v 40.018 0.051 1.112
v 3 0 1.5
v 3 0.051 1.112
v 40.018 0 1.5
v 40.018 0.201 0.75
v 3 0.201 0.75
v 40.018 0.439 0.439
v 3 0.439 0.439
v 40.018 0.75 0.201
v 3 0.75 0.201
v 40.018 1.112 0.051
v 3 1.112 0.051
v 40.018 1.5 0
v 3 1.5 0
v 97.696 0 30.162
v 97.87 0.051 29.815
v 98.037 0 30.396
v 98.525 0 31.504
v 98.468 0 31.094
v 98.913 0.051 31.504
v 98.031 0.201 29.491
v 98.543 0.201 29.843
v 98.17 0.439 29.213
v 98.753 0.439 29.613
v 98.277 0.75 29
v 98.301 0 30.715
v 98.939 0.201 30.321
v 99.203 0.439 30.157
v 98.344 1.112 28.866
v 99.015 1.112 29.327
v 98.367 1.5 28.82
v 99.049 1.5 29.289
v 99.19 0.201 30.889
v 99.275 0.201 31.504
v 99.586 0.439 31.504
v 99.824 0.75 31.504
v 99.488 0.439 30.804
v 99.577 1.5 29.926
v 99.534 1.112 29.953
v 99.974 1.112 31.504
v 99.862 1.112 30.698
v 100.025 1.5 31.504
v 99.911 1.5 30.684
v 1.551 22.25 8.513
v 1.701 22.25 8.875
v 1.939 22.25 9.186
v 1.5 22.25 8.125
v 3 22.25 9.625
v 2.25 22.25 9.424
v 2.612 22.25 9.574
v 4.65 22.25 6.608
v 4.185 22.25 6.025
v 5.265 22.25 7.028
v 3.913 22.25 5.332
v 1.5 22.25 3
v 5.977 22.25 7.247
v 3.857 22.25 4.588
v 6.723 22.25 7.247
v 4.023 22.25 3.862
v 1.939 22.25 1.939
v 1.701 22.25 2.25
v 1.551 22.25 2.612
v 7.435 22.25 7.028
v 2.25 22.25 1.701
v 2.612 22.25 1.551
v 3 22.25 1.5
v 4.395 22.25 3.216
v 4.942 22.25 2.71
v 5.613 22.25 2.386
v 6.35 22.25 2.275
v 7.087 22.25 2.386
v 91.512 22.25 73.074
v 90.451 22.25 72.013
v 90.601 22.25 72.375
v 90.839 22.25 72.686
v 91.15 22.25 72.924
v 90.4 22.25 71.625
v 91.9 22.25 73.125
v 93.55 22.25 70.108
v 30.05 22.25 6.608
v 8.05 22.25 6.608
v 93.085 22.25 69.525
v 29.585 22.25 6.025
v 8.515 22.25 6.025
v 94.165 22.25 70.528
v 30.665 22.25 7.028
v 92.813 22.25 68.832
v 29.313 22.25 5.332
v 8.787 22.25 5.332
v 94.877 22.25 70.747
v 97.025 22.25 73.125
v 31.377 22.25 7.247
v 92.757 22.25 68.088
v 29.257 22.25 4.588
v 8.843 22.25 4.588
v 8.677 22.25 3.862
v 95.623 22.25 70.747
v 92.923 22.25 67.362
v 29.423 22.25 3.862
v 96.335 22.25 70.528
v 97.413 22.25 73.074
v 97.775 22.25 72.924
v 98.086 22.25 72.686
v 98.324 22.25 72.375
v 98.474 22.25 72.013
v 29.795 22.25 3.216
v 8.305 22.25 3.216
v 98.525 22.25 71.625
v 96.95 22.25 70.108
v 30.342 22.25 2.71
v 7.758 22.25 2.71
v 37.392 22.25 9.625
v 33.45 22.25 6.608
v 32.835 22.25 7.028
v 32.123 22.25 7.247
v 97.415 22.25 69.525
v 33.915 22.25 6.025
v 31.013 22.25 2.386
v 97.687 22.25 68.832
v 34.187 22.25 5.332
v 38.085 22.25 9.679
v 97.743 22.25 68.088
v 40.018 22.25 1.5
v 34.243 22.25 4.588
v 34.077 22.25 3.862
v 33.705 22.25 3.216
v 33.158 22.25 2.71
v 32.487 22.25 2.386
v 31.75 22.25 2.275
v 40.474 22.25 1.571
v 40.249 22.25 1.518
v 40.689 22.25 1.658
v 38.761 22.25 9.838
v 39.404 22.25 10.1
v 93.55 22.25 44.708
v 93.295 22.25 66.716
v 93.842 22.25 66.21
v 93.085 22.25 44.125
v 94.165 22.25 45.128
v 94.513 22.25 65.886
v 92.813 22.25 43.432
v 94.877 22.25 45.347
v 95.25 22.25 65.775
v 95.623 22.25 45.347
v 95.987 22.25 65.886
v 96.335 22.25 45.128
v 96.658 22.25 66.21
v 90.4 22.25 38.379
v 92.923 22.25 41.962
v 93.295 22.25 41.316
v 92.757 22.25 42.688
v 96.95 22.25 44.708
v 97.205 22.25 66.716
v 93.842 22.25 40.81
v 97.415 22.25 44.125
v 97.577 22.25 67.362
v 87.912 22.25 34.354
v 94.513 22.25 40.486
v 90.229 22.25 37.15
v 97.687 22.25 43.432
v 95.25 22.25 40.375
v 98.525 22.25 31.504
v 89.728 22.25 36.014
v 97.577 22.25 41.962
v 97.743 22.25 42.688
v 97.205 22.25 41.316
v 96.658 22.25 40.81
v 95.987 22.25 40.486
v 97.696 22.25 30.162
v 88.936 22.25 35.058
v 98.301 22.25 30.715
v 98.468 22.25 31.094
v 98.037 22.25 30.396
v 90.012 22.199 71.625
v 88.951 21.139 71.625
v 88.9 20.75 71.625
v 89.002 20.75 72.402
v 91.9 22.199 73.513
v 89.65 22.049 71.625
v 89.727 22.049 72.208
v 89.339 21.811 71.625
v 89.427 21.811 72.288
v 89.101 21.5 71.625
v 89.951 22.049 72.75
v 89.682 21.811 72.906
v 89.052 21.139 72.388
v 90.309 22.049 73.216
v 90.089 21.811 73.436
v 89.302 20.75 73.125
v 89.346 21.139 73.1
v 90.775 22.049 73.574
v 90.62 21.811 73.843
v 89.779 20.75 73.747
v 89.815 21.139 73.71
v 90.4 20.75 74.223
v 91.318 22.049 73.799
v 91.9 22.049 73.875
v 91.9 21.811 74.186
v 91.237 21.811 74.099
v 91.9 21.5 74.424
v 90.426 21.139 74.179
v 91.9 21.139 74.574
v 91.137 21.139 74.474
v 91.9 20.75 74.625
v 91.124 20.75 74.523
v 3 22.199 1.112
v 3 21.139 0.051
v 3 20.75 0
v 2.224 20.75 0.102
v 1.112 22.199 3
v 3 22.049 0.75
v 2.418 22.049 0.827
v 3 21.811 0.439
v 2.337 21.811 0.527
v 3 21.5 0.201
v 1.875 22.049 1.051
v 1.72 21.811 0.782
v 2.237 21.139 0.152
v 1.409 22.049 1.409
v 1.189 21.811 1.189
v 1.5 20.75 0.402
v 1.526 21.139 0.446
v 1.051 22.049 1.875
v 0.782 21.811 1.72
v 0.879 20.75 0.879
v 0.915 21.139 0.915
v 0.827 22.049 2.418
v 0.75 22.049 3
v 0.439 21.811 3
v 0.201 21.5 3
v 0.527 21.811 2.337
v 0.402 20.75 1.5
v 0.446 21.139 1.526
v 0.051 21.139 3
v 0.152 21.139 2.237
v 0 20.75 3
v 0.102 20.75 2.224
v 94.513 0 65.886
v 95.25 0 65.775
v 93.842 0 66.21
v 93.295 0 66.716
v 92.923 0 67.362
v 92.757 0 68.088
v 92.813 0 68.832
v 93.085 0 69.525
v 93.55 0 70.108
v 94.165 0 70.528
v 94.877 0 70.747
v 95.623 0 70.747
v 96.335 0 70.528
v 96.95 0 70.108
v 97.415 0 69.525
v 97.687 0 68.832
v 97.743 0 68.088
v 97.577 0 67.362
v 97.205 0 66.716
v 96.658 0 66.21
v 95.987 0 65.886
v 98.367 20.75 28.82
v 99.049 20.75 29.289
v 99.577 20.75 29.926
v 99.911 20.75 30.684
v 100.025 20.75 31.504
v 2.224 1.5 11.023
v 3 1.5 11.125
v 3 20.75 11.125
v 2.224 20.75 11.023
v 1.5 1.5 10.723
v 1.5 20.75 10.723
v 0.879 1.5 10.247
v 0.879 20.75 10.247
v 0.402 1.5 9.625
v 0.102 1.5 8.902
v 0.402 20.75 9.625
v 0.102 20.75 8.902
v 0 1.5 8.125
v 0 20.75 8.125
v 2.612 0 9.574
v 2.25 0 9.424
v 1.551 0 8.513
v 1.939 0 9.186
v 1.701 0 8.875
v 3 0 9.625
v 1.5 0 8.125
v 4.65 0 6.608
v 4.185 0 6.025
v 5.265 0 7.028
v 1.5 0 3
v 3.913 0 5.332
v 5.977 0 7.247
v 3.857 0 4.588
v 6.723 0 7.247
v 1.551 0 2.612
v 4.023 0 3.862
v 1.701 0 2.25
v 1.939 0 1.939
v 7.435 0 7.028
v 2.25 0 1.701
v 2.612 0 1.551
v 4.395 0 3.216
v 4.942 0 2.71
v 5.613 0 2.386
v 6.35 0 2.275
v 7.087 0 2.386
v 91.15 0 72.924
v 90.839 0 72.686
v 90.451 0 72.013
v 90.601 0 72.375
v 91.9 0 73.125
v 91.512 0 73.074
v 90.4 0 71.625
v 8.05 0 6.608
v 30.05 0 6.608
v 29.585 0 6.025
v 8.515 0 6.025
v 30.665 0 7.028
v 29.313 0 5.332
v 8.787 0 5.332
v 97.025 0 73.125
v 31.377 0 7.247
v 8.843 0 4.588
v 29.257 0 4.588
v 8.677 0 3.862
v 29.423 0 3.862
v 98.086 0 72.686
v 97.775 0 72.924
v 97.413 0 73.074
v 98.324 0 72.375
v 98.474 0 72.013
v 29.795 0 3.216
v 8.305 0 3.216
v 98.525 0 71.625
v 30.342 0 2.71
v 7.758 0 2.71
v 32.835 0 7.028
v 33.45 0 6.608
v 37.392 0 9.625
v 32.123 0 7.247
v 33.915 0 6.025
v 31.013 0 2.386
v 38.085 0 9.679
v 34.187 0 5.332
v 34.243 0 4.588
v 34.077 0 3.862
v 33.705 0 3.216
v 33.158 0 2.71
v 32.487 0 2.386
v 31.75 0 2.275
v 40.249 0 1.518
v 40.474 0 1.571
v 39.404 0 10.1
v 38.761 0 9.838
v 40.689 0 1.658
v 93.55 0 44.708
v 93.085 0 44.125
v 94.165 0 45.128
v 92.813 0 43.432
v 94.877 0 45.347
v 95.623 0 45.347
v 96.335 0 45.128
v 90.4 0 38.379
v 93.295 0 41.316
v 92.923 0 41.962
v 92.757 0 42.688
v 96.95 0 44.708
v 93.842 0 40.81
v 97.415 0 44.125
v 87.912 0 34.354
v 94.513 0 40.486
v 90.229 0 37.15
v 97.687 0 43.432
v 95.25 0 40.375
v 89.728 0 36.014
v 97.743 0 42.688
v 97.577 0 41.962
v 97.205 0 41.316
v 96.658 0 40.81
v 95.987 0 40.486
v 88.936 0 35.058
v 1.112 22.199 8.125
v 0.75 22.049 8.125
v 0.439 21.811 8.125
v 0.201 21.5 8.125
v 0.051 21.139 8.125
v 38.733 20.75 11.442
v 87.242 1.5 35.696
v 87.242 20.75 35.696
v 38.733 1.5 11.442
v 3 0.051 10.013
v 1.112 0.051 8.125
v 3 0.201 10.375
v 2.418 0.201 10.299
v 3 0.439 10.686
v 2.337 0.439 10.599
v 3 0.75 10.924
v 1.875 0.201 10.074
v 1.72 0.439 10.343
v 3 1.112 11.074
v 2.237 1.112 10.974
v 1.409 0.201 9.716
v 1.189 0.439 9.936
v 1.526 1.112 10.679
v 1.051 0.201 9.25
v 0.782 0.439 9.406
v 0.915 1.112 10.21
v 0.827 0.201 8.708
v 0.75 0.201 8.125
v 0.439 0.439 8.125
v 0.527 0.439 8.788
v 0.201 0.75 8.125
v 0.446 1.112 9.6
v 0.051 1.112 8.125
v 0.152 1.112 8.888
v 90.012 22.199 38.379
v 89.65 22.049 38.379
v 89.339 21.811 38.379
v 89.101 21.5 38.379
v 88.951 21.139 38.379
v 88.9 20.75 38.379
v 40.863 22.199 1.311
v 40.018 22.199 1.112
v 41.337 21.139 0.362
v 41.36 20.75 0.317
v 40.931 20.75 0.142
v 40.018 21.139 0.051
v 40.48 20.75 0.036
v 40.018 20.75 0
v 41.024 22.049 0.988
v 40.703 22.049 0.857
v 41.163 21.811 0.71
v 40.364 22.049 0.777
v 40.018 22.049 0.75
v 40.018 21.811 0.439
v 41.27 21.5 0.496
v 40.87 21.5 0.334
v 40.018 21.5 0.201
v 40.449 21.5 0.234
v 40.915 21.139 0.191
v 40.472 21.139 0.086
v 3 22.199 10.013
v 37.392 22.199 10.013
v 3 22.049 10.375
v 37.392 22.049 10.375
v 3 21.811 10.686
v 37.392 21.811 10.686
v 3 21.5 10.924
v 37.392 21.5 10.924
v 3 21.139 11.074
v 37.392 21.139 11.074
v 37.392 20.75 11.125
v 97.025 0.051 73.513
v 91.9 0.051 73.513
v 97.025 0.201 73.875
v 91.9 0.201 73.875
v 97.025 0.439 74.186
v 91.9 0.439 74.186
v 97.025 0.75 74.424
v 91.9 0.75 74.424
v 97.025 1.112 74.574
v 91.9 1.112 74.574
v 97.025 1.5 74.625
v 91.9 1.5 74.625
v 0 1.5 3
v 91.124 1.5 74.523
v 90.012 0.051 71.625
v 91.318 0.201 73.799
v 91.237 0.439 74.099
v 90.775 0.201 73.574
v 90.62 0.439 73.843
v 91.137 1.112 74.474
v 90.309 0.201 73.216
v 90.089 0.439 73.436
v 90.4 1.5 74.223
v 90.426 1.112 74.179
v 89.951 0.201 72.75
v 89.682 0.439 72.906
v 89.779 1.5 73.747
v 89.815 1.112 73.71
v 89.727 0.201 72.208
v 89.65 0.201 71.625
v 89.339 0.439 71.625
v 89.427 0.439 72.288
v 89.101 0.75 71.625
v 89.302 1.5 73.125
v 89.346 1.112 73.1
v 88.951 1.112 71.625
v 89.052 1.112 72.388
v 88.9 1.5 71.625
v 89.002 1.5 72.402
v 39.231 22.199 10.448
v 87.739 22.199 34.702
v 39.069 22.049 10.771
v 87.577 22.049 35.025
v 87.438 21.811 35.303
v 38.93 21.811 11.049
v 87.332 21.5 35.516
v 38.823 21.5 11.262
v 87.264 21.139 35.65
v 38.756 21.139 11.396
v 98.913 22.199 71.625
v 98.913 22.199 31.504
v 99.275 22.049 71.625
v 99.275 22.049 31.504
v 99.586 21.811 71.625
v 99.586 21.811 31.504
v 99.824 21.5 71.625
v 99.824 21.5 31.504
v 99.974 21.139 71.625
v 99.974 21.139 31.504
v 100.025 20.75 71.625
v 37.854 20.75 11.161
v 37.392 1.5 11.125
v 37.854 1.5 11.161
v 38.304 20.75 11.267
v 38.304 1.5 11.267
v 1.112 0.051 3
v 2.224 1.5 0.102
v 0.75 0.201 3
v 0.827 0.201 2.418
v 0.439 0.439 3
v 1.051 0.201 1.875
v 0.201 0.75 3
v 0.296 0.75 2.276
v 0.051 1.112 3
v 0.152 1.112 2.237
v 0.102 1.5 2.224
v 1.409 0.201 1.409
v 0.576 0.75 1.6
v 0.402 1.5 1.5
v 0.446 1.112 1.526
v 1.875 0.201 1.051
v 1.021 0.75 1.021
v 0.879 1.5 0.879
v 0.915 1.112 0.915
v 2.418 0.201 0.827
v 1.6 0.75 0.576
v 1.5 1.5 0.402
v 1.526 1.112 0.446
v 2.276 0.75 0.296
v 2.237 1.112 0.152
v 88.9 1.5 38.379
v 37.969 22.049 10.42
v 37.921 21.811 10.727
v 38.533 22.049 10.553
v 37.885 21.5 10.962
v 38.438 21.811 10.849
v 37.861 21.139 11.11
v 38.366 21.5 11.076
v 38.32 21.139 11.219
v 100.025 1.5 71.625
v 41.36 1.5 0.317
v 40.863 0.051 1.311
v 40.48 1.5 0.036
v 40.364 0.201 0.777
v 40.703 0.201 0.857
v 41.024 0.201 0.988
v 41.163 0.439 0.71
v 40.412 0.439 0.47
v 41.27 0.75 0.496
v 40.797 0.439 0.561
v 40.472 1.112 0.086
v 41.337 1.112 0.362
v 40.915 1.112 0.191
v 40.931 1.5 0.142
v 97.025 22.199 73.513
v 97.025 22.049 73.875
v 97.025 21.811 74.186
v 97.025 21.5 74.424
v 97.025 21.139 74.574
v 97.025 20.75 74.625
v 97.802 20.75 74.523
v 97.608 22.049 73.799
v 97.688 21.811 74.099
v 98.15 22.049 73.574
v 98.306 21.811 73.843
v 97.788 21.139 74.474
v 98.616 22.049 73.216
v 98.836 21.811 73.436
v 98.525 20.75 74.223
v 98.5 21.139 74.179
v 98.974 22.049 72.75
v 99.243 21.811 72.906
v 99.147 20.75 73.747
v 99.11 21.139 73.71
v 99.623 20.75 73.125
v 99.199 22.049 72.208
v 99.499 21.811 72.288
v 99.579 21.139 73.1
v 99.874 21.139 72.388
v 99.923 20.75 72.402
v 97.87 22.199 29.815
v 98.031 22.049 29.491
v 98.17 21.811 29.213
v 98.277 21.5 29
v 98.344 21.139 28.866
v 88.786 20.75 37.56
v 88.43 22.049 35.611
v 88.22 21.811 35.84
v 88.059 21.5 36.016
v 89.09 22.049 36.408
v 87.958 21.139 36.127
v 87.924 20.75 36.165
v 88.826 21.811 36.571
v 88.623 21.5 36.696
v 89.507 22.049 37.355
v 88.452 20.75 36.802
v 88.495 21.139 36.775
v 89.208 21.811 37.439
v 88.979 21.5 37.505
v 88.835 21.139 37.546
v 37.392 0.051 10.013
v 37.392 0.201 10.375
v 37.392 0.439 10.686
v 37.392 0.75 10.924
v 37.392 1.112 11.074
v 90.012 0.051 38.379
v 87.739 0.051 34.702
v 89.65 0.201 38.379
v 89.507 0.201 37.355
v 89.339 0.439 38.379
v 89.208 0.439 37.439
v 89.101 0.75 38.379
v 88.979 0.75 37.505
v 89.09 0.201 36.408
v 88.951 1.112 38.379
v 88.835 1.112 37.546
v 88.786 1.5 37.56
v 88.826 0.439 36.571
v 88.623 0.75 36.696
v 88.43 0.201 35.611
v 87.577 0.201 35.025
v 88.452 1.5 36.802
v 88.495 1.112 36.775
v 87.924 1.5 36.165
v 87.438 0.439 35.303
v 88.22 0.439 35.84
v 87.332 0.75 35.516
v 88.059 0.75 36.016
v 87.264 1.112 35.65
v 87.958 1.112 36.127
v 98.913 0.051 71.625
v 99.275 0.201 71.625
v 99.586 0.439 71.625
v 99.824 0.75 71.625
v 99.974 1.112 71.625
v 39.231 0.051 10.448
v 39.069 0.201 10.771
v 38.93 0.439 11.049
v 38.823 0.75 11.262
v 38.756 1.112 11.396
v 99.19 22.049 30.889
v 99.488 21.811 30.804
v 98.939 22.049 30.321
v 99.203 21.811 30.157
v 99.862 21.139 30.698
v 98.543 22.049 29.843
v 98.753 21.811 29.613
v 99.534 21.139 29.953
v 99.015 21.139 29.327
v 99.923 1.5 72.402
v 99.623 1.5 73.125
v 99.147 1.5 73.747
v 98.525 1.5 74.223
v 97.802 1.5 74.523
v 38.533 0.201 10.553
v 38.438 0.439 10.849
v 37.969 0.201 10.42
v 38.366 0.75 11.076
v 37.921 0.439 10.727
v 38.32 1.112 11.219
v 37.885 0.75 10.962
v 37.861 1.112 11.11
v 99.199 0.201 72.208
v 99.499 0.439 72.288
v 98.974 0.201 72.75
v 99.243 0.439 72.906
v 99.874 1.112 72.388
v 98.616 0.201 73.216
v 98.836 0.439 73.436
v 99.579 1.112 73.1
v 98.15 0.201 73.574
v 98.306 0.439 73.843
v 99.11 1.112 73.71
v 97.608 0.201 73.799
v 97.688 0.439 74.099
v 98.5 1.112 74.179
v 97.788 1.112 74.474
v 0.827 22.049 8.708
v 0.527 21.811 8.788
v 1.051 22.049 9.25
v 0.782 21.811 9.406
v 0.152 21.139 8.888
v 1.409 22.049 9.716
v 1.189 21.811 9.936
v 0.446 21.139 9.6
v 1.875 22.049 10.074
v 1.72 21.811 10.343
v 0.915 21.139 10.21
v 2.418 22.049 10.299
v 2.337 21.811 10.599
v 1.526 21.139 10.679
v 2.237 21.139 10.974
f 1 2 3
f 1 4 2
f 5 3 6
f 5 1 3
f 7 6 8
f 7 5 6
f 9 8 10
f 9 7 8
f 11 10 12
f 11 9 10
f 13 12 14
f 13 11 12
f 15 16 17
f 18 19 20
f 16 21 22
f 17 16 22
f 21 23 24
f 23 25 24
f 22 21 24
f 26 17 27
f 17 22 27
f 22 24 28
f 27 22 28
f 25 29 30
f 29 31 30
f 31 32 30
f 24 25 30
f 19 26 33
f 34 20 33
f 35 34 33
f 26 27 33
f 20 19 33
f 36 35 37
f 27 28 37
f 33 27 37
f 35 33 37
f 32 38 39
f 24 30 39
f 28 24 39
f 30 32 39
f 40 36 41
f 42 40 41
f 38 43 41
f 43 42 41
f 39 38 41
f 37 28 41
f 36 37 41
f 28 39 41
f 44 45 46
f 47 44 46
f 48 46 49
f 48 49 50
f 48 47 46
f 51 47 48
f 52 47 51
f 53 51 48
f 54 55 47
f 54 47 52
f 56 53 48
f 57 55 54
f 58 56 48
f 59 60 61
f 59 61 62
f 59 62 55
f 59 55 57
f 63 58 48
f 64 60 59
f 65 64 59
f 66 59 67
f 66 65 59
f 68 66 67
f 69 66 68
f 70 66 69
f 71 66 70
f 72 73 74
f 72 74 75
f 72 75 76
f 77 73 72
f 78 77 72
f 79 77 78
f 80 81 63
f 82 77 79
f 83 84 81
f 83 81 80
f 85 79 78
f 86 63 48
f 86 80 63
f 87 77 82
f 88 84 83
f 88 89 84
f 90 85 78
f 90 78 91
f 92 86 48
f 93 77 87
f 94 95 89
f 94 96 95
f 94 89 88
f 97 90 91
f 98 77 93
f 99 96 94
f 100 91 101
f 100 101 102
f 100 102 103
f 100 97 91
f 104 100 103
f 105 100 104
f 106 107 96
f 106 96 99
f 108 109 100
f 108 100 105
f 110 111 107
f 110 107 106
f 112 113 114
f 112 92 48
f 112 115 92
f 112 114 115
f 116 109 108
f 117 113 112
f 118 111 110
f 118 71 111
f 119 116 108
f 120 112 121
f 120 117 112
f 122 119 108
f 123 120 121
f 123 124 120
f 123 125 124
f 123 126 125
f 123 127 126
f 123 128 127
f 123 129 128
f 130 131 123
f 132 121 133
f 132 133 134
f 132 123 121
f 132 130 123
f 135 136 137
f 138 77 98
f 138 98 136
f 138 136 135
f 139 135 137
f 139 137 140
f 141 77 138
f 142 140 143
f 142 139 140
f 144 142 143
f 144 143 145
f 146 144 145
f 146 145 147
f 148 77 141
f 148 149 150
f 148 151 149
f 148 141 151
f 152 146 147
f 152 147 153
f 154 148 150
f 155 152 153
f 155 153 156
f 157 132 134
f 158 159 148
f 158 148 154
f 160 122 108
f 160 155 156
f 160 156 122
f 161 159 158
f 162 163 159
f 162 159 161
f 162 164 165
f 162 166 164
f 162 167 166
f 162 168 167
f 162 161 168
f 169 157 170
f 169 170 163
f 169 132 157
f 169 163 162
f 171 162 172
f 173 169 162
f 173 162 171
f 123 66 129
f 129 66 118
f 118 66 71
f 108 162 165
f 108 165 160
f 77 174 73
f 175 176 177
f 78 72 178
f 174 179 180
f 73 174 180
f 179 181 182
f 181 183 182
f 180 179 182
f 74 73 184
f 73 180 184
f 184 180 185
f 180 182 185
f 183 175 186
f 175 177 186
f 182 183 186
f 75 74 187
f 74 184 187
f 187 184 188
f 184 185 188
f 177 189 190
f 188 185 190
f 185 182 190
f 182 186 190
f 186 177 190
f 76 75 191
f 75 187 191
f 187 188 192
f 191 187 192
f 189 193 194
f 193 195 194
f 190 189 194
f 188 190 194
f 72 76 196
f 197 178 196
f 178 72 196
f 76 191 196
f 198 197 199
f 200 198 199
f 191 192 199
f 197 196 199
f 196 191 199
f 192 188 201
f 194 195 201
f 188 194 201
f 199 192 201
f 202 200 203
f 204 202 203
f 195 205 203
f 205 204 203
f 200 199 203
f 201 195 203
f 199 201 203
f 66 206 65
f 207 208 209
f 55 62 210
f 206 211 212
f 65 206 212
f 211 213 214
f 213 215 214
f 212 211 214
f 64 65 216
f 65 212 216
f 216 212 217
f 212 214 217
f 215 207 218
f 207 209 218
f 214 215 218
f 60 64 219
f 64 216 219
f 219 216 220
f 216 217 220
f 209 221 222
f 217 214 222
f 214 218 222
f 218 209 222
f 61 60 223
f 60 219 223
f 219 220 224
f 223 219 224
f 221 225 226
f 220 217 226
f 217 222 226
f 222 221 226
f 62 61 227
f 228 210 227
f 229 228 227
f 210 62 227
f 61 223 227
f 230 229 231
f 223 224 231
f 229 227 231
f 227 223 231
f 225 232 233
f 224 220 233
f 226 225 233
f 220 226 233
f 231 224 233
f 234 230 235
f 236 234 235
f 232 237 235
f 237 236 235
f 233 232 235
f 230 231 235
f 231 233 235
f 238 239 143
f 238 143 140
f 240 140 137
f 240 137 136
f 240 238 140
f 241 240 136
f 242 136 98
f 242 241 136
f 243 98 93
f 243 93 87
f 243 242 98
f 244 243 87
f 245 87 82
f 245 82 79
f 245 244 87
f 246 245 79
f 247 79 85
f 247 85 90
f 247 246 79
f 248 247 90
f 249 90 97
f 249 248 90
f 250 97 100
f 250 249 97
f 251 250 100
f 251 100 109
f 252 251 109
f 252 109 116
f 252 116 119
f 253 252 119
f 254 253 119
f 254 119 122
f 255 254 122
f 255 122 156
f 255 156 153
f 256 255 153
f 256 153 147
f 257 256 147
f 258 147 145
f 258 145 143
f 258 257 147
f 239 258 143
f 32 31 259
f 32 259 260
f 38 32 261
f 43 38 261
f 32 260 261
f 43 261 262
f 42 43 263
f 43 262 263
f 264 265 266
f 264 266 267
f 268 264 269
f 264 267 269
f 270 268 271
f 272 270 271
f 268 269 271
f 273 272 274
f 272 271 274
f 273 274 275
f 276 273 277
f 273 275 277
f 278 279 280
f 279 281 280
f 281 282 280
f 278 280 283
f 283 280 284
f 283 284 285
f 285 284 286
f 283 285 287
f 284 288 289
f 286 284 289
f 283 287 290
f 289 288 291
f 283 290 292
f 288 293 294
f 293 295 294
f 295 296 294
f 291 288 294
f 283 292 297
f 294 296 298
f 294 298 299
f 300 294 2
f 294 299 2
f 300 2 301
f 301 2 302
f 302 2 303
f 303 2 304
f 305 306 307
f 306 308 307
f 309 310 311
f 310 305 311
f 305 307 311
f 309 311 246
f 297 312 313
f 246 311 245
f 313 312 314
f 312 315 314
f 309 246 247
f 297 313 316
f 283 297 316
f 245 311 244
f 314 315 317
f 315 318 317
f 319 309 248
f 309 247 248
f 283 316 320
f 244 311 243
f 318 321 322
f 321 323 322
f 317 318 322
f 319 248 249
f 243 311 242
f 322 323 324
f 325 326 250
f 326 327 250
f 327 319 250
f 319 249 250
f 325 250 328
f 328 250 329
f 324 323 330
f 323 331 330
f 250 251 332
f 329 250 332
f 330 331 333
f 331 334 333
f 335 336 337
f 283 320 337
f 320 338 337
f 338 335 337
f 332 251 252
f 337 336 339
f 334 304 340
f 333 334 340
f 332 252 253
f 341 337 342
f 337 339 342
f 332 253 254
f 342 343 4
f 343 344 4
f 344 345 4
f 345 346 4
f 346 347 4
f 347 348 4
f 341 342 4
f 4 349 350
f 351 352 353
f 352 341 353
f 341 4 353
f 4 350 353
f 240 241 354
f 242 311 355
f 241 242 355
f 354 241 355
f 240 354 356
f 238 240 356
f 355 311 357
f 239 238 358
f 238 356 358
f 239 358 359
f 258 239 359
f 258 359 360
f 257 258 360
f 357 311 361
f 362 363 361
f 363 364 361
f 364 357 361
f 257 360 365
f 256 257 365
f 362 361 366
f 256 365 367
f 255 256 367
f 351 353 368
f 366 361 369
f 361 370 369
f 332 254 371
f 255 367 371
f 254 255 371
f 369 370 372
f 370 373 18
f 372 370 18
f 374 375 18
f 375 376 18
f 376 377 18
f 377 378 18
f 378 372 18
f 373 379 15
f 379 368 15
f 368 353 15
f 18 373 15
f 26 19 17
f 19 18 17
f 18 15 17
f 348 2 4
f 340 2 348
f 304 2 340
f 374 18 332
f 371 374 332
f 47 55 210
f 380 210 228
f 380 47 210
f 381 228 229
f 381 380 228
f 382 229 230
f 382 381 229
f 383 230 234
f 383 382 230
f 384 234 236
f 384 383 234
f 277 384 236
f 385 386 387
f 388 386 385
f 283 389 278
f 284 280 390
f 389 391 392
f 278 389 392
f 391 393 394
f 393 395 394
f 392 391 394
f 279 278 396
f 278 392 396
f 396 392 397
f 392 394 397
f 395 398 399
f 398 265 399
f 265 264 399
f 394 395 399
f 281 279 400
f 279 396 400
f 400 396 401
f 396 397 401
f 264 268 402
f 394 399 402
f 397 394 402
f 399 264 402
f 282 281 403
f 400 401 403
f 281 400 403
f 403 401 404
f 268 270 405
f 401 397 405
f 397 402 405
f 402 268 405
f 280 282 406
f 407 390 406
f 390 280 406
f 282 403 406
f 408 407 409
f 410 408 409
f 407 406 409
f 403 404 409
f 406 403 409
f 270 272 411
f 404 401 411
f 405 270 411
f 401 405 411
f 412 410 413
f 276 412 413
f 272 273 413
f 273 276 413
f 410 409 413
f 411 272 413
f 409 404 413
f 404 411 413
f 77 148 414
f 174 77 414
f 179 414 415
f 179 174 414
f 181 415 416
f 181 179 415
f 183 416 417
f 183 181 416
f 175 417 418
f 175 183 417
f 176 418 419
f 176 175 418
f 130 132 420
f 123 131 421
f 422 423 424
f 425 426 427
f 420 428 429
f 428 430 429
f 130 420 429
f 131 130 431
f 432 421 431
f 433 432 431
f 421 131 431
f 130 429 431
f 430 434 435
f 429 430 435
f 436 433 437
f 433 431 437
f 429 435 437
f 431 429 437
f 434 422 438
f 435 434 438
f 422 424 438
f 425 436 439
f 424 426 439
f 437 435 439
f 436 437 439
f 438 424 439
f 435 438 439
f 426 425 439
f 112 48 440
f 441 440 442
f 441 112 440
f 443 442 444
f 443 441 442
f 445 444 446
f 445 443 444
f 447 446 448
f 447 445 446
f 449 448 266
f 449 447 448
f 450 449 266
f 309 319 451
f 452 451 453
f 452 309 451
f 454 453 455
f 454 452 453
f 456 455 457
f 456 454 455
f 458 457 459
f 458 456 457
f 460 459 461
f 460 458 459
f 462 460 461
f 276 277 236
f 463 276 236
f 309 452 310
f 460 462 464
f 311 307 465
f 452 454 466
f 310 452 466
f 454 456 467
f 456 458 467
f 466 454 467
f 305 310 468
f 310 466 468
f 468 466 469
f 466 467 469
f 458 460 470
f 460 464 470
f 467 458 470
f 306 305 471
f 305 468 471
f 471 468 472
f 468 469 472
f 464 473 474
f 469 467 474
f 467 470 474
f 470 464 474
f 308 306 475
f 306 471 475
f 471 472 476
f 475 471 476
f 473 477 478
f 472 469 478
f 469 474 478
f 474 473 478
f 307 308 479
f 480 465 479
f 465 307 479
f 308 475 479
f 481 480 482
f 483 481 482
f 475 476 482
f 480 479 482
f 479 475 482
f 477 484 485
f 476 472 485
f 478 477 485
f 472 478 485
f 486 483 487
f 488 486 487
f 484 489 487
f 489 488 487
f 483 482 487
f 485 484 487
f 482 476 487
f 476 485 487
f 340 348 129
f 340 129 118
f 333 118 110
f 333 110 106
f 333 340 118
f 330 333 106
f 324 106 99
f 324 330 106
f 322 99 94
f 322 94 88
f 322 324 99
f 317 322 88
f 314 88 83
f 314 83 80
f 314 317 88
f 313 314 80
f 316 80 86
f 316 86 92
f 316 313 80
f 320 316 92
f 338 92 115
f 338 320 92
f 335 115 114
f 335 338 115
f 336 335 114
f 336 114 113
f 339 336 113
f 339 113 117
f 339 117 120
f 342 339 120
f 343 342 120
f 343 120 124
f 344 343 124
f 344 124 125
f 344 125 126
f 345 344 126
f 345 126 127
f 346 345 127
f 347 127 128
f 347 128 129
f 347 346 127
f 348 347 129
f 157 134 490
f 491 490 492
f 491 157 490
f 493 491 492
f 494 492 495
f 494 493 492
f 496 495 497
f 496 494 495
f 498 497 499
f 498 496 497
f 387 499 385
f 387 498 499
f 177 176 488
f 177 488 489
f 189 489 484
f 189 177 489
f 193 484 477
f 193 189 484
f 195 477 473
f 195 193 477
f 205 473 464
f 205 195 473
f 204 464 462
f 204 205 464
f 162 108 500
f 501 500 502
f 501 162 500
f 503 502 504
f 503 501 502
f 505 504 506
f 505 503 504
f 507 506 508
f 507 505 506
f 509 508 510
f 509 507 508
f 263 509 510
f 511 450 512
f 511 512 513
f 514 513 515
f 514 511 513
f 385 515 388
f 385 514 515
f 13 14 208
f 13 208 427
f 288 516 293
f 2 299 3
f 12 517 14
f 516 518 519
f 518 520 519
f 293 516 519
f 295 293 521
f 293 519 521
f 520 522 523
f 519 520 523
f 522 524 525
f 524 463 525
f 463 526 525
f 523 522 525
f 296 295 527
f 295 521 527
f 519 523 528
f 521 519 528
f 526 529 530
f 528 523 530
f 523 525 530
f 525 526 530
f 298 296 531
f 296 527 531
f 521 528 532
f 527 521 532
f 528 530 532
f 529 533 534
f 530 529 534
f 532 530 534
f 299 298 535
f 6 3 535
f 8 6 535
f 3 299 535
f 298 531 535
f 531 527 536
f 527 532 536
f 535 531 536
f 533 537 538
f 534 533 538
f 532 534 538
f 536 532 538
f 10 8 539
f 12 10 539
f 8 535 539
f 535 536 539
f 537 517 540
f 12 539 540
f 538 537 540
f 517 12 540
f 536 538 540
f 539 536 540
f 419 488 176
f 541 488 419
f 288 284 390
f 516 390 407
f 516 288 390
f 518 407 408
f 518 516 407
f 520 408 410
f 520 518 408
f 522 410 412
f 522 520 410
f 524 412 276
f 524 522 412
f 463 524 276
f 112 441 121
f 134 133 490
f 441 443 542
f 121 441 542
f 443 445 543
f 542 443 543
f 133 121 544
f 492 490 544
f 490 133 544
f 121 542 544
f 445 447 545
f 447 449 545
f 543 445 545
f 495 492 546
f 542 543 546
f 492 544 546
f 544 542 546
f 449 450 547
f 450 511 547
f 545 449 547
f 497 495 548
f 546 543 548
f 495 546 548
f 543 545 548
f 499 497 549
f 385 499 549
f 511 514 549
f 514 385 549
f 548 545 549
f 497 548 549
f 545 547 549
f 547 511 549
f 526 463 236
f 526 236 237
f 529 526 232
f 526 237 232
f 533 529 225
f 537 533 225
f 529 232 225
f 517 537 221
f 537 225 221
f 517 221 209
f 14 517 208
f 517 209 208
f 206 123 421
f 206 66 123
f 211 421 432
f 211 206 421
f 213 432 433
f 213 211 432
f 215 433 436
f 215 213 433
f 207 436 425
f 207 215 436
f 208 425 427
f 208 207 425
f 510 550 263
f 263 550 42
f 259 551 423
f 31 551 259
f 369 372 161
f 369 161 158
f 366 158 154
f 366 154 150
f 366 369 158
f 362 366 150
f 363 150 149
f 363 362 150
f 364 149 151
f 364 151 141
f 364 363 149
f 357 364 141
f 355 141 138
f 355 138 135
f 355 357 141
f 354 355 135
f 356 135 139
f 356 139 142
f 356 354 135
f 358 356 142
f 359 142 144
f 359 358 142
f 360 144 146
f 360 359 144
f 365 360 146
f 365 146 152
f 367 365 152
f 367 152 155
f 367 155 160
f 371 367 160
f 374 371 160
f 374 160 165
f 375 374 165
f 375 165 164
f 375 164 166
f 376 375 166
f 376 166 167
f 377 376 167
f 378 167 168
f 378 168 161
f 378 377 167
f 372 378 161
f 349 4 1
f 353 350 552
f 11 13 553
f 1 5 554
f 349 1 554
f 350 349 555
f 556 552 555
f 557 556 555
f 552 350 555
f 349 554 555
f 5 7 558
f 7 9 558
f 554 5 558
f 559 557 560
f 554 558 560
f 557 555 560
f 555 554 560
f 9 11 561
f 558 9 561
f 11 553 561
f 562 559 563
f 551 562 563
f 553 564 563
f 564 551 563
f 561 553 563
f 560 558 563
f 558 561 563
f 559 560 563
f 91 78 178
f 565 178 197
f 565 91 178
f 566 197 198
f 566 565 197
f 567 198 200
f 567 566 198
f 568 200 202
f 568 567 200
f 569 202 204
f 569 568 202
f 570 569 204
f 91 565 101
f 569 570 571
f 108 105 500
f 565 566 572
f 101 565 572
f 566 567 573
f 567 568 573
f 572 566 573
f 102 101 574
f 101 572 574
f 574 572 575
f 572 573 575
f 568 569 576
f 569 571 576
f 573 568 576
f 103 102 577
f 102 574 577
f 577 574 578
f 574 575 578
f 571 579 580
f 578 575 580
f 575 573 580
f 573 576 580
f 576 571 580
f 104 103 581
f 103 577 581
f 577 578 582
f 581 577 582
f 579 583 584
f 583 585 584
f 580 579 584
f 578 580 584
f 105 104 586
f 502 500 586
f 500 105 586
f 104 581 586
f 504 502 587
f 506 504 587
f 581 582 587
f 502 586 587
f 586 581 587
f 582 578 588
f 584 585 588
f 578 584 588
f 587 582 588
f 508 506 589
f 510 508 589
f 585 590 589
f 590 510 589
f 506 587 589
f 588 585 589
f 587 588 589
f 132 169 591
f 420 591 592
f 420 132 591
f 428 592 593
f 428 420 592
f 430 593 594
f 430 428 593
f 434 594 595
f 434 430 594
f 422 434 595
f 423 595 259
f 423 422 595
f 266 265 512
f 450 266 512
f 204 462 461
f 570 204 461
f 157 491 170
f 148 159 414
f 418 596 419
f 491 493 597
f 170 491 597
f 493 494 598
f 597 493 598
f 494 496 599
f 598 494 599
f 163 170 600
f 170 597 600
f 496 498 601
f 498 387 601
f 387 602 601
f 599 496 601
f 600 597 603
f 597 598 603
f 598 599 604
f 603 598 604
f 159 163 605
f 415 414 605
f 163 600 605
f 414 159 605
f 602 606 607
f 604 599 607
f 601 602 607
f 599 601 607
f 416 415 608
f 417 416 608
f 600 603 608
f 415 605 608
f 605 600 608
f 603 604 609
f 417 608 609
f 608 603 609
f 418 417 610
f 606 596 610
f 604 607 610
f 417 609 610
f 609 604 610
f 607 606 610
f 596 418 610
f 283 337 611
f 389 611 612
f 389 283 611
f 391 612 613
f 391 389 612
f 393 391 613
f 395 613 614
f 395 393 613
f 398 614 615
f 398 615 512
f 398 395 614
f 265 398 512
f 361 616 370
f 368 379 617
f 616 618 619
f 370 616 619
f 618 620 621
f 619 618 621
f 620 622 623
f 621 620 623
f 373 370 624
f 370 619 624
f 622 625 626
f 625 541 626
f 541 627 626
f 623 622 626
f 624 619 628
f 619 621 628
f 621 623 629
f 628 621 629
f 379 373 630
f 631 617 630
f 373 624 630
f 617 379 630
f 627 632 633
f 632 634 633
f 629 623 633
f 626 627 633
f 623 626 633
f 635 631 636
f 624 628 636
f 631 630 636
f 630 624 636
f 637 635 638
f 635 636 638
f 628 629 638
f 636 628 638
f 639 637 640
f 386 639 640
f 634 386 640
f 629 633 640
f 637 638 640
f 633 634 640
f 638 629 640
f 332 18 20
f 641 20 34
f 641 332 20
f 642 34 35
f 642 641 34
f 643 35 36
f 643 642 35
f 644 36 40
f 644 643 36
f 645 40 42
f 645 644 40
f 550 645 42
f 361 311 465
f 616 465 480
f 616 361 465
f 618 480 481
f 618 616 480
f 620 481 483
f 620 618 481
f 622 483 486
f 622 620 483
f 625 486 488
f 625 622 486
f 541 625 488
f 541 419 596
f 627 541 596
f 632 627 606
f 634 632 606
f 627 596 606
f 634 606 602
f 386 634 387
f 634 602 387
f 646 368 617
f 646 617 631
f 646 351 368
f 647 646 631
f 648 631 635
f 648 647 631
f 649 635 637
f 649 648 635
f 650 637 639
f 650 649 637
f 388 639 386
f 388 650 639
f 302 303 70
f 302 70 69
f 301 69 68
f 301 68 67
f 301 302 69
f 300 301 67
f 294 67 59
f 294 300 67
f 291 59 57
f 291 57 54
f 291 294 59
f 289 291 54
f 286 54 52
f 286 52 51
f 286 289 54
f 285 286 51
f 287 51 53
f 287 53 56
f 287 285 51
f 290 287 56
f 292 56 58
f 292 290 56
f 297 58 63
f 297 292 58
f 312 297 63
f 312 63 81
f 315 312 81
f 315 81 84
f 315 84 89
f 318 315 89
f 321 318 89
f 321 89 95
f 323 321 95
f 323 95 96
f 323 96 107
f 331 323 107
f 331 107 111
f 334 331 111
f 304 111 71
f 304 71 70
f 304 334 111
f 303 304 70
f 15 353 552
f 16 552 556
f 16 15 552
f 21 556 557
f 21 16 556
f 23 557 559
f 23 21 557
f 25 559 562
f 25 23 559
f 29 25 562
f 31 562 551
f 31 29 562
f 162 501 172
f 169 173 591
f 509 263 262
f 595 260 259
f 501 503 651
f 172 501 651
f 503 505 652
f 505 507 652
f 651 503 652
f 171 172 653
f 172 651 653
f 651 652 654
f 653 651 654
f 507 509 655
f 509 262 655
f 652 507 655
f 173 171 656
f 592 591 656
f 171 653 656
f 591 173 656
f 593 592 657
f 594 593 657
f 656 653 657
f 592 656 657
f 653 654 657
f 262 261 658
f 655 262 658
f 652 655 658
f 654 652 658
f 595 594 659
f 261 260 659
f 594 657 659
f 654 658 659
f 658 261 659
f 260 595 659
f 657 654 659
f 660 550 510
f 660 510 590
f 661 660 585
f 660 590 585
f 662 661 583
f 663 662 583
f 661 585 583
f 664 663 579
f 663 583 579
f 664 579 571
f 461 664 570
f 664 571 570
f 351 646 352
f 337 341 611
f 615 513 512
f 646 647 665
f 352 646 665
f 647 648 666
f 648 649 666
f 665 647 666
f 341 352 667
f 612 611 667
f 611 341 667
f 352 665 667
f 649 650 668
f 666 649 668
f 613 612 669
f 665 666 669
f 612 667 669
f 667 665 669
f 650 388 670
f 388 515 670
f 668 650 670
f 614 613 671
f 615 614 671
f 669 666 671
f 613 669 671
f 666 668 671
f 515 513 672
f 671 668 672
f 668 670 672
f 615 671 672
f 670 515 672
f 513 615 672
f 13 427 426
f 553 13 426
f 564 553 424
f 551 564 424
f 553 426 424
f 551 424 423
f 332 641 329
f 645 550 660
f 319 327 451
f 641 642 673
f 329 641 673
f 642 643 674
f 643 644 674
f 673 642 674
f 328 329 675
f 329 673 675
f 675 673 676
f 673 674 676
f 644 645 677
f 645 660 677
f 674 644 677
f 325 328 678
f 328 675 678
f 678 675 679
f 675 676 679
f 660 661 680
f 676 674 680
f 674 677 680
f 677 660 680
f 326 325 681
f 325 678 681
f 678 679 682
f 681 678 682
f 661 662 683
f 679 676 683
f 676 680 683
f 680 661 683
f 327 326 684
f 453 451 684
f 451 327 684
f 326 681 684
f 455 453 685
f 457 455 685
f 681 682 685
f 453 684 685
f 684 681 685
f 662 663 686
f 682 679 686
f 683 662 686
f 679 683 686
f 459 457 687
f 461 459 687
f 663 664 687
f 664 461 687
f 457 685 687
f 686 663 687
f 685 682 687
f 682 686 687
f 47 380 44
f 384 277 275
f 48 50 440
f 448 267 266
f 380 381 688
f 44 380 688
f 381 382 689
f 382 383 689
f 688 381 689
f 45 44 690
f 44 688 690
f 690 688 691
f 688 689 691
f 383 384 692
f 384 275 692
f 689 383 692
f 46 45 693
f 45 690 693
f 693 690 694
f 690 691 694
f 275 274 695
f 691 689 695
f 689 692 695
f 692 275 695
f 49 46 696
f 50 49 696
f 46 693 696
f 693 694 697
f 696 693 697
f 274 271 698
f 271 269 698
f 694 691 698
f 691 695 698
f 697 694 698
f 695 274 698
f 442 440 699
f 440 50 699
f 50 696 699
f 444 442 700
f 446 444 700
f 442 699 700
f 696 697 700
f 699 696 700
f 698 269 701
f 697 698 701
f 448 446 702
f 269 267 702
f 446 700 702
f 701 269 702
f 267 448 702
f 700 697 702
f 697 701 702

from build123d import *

# Parameters (mm, degrees)
SKETCH1_W           = 38.1
SKETCH1_H           = 11.1252
SKETCH1_R           = 2.5
SKETCH1_W_2         = 11.1252
SKETCH1_H_2         = 38.1
BOSS_EXTRUDE1_DEPTH = 22.2504
FILLET1_R           = 3
FILLET2_R           = 1.5


with BuildPart() as part:
    # Sketch1 → Boss-Extrude1 (new body)
    # profile 1 of 3: a face of its own
    with BuildSketch(Plane(origin=(0, 0, 0), x_dir=(1, 0, 0), z_dir=(0, 1, 0))):
        with Locations((19.05, -5.5626)):
            Rectangle(SKETCH1_W, SKETCH1_H)
        with Locations(Location((6.35, -4.7752, 0), (0, 0, 90))):
            Circle(SKETCH1_R, mode=Mode.SUBTRACT)
        with Locations(Location((31.75, -4.7752, 0), (0, 0, 90))):
            Circle(SKETCH1_R, mode=Mode.SUBTRACT)
    # profile 2 of 3: a face of its own
    with BuildSketch(Plane(origin=(0, 0, 0), x_dir=(1, 0, 0), z_dir=(0, 1, 0))):
        Polygon((100.0252, -29.649448268), (100.0252, -36.5252), (88.9, -36.5252), (38.1, -11.1252), (38.1, 0), (40.726303463, 0), align=None)
    # profile 3 of 3: a face of its own
    with BuildSketch(Plane(origin=(0, 0, 0), x_dir=(1, 0, 0), z_dir=(0, 1, 0))):
        with Locations((94.4626, -55.5752)):
            Rectangle(SKETCH1_W_2, SKETCH1_H_2)
        with Locations(Location((95.25, -68.2752, 0), (0, 0, 90))):
            Circle(SKETCH1_R, mode=Mode.SUBTRACT)
        with Locations(Location((95.25, -42.8752, 0), (0, 0, 90))):
            Circle(SKETCH1_R, mode=Mode.SUBTRACT)
    extrude(amount=BOSS_EXTRUDE1_DEPTH)

    # Fillet1
    fillet1_edges = [part.edges().sort_by_distance(p)[0] for p in [
        (0, 11.1252, 11.1252),
        (0, 11.1252, 0),
        (40.726303463, 11.1252, 0),
        (100.0252, 11.1252, 29.649448268),
        (100.0252, 11.1252, 74.6252),
        (88.9, 11.1252, 74.6252),
        (88.9, 11.1252, 36.5252),
        (38.1, 11.1252, 11.1252),
    ]]
    fillet(fillet1_edges, radius=FILLET1_R)

    # Fillet2
    fillet2_edges = [part.edges().sort_by_distance(p)[0] for p in [
        (21.509049765, 0, 0),
        (21.509049765, 22.2504, 0),
        (20.195898034, 0, 11.1252),
        (0, 0, 5.5626),
        (69.863290552, 0, 14.568493544),
        (100.0252, 0, 51.564375117),
        (94.4626, 0, 74.6252),
        (88.9, 0, 55.002250983),
        (62.98753882, 0, 23.56896941),
        (0.878679656, 0, 0.878679656),
        (0.878679656, 0, 10.246520344),
        (89.778679656, 0, 73.746520344),
        (99.146520344, 0, 73.746520344),
        (99.577152425, 0, 29.926356898),
        (40.707358292, 0, 0.080253032),
        (69.863290552, 22.2504, 14.568493544),
        (20.195898034, 22.2504, 11.1252),
        (62.98753882, 22.2504, 23.56896941),
        (88.9, 22.2504, 55.002250983),
        (94.4626, 22.2504, 74.6252),
        (100.0252, 22.2504, 51.564375117),
        (0, 22.2504, 5.5626),
        (0.878679656, 22.2504, 0.878679656),
        (0.878679656, 22.2504, 10.246520344),
        (89.778679656, 22.2504, 73.746520344),
        (99.146520344, 22.2504, 73.746520344),
        (99.577152425, 22.2504, 29.926356898),
        (40.707358292, 22.2504, 0.080253032),
        (38.081054829, 0, 11.205453032),
        (38.081054829, 22.2504, 11.205453032),
        (88.451952425, 0, 36.80210863),
        (88.451952425, 22.2504, 36.80210863),
    ]]
    fillet(fillet2_edges, radius=FILLET2_R)


solid = part.part
